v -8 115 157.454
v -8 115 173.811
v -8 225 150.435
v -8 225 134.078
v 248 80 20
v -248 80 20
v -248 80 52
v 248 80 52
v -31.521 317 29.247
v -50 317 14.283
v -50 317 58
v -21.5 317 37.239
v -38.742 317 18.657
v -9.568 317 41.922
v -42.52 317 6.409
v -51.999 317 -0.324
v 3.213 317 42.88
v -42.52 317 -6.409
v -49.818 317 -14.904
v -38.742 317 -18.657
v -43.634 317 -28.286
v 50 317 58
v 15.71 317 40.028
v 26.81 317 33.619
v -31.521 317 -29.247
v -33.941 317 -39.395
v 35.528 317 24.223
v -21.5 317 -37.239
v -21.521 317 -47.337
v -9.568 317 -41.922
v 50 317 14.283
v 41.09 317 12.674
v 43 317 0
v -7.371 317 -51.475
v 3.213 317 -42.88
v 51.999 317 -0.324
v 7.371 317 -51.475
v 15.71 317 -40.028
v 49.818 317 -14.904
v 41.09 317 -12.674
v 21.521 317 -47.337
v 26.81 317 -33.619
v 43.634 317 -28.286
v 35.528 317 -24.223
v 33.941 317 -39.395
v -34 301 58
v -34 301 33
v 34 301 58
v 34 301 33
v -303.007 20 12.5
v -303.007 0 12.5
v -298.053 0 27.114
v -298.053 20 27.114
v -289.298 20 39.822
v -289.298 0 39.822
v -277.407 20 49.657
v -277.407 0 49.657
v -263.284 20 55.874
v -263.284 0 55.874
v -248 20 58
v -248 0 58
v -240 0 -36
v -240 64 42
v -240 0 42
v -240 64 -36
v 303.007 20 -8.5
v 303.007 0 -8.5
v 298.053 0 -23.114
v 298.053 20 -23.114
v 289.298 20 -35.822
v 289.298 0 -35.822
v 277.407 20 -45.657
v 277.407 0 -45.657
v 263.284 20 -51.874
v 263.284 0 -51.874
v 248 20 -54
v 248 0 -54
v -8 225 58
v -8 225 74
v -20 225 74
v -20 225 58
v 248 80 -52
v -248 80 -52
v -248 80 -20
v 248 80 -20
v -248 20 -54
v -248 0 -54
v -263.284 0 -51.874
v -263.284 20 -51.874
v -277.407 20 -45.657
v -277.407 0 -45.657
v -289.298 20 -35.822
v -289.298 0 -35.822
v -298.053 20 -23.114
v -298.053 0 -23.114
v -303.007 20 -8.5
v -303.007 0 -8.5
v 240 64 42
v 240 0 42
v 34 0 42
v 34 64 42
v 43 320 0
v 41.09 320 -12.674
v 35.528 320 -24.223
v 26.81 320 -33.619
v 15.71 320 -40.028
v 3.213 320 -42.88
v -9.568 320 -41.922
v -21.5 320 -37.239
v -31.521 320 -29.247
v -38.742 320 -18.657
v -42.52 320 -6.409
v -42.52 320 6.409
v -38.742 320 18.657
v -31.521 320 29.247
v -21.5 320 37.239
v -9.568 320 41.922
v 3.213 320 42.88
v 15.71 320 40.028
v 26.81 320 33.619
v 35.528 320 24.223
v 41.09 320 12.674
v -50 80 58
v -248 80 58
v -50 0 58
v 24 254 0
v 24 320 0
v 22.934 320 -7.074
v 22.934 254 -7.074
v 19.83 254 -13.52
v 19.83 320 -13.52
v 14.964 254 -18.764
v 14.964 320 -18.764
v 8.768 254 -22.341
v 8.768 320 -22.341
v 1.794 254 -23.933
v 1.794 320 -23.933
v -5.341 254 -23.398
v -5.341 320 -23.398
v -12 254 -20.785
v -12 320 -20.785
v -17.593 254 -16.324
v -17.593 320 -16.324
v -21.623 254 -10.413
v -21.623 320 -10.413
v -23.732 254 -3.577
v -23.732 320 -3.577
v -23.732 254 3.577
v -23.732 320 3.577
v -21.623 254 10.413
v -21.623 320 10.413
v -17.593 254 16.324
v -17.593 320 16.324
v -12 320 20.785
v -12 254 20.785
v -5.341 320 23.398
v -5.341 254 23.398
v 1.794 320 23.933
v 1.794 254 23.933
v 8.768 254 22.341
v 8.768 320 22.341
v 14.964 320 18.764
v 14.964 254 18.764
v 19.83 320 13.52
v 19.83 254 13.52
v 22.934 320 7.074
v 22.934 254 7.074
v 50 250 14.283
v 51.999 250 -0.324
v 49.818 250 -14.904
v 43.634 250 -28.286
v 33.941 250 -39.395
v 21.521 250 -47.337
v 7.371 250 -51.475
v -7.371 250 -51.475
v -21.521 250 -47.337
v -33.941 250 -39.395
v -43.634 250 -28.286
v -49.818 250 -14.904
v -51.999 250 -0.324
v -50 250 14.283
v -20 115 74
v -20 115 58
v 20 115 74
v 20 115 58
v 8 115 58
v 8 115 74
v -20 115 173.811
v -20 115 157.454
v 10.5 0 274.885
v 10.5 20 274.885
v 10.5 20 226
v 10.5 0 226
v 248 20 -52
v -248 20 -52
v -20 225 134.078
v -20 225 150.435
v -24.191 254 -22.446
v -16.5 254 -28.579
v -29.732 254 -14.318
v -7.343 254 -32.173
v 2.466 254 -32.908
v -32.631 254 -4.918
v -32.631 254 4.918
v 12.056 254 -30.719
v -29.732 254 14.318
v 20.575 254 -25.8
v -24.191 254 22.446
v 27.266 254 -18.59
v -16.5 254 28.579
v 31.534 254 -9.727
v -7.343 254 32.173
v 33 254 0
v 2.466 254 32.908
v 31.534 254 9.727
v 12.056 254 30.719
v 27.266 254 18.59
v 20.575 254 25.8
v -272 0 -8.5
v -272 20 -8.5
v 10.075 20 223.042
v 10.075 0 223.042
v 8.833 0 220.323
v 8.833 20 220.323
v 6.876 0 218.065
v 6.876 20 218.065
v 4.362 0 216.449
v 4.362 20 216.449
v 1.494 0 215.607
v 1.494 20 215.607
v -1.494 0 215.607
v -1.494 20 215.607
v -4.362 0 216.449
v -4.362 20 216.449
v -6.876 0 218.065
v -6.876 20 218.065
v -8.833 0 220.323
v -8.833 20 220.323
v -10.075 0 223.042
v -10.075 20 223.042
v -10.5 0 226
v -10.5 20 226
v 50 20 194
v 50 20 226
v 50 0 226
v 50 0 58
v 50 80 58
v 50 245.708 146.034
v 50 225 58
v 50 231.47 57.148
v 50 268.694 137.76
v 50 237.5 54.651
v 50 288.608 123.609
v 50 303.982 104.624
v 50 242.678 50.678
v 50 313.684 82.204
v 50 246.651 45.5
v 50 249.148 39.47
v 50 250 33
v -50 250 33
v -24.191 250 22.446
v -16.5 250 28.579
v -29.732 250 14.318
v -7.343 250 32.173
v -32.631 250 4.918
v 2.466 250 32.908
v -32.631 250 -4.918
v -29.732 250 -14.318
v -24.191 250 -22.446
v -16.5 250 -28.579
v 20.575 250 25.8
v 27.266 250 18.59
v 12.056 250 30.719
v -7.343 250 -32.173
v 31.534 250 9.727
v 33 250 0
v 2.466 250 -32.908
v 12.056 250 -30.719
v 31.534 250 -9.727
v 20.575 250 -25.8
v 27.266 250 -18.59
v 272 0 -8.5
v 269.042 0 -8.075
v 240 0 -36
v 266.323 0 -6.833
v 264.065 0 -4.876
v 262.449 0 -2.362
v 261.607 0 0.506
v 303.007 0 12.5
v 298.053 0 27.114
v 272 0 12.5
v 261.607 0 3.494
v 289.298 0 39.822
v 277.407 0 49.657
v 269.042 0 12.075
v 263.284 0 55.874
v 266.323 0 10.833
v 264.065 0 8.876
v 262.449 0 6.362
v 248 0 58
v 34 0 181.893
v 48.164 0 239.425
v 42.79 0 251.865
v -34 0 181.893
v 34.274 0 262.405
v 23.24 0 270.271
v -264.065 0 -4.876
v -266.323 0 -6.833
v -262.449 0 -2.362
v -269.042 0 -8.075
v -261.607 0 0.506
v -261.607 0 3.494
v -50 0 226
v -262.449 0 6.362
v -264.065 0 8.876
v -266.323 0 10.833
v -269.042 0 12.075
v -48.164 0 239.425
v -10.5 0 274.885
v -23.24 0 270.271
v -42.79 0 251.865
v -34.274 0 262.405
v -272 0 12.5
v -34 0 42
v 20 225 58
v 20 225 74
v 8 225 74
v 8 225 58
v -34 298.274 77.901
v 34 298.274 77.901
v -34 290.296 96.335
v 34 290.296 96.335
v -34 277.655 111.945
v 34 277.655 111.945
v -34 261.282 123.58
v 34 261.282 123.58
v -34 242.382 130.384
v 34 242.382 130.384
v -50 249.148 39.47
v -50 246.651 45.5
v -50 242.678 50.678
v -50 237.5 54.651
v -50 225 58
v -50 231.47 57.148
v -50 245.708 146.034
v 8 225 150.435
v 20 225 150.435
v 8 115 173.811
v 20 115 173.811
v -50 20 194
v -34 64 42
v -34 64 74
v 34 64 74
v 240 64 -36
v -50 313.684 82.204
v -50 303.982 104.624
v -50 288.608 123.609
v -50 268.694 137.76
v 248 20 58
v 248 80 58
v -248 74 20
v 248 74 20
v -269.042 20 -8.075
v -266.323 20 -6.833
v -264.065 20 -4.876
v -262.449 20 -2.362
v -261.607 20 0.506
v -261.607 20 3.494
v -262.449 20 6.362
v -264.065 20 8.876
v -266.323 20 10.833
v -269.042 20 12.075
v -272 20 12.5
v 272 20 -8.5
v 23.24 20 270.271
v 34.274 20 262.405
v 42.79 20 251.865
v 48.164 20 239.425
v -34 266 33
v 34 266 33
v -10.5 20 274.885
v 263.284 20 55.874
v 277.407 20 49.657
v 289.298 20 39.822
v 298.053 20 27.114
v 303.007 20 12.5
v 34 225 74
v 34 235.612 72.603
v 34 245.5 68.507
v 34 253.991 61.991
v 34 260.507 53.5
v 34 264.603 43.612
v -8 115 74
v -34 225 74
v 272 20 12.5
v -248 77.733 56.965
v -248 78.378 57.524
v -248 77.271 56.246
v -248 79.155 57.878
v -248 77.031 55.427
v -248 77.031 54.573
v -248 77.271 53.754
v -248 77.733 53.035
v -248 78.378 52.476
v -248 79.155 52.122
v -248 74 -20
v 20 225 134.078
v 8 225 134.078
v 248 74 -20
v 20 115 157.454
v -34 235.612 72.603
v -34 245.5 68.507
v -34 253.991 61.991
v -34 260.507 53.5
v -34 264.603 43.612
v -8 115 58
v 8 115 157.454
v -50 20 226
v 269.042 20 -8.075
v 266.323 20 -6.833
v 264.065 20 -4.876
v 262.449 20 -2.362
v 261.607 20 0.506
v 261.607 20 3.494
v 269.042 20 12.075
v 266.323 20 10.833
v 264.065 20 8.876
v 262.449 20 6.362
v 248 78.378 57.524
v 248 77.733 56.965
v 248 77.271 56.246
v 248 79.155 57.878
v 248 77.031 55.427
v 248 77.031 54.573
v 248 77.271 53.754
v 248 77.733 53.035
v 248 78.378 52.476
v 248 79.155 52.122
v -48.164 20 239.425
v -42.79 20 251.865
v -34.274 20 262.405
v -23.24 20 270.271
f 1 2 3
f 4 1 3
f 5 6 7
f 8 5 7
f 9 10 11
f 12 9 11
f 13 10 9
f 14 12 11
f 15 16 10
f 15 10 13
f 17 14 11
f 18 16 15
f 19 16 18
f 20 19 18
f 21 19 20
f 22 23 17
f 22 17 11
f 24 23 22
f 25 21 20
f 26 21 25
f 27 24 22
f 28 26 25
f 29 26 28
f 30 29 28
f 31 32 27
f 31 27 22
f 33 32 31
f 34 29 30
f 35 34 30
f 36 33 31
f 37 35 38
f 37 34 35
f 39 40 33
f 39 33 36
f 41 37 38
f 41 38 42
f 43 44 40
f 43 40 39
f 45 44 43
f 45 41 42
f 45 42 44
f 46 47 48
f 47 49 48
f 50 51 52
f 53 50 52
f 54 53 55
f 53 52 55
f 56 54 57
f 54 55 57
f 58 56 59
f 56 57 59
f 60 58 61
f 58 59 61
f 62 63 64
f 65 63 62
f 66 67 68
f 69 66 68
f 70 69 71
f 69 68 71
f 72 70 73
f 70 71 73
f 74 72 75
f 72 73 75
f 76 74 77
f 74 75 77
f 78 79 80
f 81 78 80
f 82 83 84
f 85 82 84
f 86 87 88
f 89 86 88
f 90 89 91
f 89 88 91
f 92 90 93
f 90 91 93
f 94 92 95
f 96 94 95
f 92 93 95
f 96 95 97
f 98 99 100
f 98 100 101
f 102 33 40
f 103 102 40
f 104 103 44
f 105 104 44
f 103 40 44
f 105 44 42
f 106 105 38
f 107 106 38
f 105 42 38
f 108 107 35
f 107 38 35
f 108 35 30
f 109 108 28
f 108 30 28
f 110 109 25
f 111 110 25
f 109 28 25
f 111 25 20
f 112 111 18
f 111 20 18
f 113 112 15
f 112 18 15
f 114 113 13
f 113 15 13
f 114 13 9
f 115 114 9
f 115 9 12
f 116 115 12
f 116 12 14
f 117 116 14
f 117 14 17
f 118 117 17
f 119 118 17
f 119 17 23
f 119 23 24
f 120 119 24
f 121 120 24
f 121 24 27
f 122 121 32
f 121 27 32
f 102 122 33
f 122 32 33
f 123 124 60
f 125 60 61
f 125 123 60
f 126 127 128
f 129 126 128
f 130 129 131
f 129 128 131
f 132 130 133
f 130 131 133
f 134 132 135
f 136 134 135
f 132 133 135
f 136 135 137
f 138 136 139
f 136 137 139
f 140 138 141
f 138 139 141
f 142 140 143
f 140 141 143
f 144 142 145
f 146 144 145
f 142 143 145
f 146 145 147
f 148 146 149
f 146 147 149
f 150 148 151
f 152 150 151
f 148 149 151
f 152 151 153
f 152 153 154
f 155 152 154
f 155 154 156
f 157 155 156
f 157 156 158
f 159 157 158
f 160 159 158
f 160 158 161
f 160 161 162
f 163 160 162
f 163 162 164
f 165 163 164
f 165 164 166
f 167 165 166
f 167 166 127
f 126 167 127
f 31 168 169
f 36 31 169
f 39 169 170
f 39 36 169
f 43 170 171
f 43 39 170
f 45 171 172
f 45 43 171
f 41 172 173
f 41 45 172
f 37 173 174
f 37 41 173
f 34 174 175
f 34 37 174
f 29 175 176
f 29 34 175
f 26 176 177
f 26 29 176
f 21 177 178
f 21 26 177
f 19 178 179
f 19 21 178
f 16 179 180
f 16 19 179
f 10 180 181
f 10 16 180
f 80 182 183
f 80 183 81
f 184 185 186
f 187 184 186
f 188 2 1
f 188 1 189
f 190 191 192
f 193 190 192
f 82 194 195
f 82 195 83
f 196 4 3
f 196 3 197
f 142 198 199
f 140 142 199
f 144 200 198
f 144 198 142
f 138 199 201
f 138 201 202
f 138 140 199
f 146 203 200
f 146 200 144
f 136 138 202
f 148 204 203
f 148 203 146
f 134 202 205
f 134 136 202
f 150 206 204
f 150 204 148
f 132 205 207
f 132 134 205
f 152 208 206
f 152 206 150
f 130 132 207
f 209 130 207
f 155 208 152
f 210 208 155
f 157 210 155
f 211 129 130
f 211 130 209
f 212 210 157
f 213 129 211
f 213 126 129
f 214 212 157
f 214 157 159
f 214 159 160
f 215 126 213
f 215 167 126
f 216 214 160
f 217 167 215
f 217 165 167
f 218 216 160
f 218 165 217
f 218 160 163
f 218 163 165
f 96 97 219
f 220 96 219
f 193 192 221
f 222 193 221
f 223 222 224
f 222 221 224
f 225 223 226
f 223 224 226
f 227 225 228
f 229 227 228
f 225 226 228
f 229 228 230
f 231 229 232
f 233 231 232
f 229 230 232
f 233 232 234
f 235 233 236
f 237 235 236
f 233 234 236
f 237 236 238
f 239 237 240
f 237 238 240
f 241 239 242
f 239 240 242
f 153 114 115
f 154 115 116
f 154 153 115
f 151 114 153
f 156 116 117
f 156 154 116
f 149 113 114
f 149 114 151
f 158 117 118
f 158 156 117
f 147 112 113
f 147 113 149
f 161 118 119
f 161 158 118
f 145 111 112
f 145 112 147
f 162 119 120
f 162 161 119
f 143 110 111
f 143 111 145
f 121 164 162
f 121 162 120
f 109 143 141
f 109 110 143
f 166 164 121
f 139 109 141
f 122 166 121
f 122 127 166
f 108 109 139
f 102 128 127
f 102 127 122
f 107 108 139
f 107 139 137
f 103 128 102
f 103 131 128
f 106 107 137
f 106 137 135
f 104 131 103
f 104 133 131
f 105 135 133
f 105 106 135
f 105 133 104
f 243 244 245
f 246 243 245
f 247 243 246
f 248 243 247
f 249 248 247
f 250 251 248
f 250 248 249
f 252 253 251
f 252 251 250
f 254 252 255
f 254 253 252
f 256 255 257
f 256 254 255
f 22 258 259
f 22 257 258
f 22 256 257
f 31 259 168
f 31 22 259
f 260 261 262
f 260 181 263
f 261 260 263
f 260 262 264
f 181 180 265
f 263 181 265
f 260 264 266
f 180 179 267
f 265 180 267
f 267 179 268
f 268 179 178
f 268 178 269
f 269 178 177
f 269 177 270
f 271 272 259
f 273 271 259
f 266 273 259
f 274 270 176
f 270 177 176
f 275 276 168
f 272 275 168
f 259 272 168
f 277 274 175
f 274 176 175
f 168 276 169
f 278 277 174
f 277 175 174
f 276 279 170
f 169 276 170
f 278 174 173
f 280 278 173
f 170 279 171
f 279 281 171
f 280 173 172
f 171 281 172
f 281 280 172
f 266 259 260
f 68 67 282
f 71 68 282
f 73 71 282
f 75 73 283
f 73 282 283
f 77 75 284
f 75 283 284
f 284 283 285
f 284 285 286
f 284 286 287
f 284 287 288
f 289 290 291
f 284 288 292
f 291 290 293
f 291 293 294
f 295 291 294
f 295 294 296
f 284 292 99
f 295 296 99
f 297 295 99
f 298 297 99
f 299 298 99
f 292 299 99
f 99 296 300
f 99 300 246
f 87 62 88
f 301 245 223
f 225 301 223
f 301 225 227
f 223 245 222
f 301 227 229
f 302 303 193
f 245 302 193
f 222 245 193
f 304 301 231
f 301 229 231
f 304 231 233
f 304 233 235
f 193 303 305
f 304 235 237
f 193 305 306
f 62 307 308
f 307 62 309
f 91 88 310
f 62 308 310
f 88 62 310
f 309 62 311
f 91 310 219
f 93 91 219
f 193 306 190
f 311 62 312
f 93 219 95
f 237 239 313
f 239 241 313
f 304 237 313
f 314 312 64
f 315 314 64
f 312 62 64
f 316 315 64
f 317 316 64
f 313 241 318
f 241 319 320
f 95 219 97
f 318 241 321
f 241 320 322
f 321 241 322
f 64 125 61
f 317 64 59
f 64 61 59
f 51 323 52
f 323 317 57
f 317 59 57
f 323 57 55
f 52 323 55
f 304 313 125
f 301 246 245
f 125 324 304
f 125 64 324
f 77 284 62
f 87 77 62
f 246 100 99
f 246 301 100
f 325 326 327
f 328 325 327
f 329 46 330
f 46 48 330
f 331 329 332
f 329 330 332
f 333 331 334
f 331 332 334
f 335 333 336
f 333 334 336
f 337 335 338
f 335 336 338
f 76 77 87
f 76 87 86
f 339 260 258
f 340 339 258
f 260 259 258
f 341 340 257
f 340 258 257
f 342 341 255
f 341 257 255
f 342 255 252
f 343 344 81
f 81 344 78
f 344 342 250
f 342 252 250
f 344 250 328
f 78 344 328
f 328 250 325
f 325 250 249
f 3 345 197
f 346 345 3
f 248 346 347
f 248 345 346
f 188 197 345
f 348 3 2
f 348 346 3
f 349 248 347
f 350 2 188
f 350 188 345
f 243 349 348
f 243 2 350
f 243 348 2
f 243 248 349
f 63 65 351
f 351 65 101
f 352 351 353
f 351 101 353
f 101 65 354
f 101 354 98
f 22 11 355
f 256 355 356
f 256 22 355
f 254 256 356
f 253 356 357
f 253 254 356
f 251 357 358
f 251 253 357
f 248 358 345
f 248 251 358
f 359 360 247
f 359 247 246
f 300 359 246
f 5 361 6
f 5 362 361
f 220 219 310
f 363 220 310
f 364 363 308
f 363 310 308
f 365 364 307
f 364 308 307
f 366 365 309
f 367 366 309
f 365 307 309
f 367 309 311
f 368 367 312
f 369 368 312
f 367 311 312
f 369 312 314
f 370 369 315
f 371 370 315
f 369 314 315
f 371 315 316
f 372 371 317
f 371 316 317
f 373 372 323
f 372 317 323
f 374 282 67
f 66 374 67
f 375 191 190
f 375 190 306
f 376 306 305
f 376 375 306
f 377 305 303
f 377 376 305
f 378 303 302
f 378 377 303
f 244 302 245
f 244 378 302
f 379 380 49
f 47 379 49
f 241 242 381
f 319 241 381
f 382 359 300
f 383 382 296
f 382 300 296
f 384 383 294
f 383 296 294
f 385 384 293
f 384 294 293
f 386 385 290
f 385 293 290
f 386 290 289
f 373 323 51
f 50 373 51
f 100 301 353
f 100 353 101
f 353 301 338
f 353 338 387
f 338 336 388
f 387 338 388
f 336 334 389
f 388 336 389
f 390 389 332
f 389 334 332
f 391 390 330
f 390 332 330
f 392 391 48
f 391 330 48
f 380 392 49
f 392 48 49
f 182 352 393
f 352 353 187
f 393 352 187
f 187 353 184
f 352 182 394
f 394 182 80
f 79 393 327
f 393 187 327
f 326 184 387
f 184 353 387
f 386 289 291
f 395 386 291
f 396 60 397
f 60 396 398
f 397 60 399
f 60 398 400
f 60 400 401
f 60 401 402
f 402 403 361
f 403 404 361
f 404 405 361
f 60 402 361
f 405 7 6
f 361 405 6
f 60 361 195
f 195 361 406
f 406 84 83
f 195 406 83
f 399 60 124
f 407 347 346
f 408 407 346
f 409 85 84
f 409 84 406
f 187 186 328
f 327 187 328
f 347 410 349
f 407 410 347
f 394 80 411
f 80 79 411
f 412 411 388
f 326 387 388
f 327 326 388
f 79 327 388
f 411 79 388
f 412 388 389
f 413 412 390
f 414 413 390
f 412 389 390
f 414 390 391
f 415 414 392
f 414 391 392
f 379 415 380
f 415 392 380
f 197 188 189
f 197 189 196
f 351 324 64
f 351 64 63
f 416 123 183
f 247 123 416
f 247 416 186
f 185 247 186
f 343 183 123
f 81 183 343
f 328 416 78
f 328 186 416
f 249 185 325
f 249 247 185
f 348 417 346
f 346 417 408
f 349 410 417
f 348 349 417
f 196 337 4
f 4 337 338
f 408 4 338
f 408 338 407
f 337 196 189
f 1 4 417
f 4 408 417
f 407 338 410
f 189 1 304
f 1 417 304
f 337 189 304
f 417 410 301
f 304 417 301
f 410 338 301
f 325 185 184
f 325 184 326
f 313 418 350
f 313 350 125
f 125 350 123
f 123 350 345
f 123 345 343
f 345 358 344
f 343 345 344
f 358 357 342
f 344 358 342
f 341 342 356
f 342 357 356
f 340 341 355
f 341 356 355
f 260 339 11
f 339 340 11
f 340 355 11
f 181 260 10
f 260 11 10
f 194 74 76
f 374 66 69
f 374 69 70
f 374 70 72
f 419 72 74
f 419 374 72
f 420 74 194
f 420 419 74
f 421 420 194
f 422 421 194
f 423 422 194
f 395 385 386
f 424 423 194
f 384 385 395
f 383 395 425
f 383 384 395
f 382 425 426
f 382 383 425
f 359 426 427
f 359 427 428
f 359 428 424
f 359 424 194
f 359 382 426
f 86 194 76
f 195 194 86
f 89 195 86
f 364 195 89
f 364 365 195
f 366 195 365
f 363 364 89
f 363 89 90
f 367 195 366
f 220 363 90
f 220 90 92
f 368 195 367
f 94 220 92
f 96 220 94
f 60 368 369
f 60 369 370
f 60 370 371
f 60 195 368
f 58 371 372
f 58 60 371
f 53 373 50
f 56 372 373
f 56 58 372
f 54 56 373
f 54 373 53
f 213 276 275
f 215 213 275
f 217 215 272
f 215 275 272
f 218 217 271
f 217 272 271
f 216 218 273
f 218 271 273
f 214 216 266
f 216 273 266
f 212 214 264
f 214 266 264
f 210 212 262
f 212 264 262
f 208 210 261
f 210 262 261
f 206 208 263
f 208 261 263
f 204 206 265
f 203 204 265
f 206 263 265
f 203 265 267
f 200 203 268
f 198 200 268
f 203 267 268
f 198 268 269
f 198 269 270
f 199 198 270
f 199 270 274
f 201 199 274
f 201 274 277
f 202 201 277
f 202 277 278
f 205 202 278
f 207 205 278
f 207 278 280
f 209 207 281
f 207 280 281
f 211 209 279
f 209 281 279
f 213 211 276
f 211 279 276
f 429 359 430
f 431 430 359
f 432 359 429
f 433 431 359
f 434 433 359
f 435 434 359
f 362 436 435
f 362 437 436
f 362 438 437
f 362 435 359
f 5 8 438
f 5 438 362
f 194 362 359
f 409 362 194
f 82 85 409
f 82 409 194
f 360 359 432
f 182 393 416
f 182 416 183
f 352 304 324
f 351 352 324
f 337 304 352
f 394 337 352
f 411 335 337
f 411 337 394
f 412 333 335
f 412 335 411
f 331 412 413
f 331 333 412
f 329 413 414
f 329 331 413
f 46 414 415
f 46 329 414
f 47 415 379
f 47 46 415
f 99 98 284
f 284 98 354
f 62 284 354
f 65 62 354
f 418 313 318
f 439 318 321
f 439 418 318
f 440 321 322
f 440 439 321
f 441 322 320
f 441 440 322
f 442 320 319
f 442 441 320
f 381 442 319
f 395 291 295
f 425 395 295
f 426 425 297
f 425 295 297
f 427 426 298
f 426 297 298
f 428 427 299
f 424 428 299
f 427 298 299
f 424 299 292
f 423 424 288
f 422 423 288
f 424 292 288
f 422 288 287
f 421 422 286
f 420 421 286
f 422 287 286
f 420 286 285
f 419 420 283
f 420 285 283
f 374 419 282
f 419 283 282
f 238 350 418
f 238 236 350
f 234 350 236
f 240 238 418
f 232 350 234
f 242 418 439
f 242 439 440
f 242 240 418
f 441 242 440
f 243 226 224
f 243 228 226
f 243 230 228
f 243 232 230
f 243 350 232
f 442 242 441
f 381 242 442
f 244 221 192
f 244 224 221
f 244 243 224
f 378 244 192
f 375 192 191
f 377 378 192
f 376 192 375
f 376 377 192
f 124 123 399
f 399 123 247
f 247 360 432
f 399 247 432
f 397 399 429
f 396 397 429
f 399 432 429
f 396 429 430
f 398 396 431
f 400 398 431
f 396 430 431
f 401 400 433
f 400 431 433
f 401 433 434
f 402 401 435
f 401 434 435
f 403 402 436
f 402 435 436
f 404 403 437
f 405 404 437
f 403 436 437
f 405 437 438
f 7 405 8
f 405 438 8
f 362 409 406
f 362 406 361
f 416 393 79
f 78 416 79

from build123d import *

# Parameters (mm, degrees)
BOSS_EXTRUDE1_DEPTH = 50
SKETCH2_R           = 52
BOSS_EXTRUDE2_DEPTH = 67
SKETCH3_R           = 43
BOSS_EXTRUDE3_DEPTH = 3
CUT_EXTRUDE1_REACH  = 322
SKETCH4_R           = 24
SKETCH5_R           = 33
CUT_EXTRUDE2_DEPTH  = 4
BOSS_EXTRUDE4_DEPTH = 248
SKETCH7_R           = 3
CUT_EXTRUDE3_DEPTH  = 248
BOSS_EXTRUDE5_DEPTH = 20
SKETCH9_R           = 50
BOSS_EXTRUDE6_DEPTH = 20
CUT_EXTRUDE4_REACH  = 22
FILLET1_R           = 25
CUT_EXTRUDE5_DEPTH  = 34
SKETCH12_W          = 78
SKETCH12_H          = 64
CUT_EXTRUDE6_DEPTH  = 240
SKETCH13_W          = 12
SKETCH13_H          = 110
CUT_EXTRUDE7_DEPTH  = 240


with BuildPart() as part:
    # Sketch1 → Boss-Extrude1 (new body, symmetric)
    with BuildSketch(Plane(origin=(0, 0, 0), x_dir=(0, 0, -1), z_dir=(1, 0, 0))):
        with BuildLine():
            Line((-226, 0), (54, 0))
            Line((54, 0), (54, 20))
            Line((54, 20), (52, 20))
            Line((52, 20), (52, 80))
            Line((52, 80), (20, 80))
            Line((20, 80), (20, 74))
            Line((20, 74), (-20, 74))
            Line((-20, 74), (-20, 80))
            Line((-20, 80), (-58, 80))
            Line((-58, 80), (-58, 250))
            Line((-58, 250), (0, 250))
            Line((0, 250), (0, 317))
            Line((0, 317), (-58, 317))
            ThreePointArc((-58, 317), (-114.640297133, 296.941952651), (-146.034066228, 245.708372014))
            Line((-146.034066228, 245.708372014), (-194, 20))
            Line((-194, 20), (-226, 20))
            Line((-226, 20), (-226, 0))
        make_face()
    extrude(amount=BOSS_EXTRUDE1_DEPTH, both=True)

    # Sketch2 → Boss-Extrude2 (add)
    with BuildSketch(Plane(origin=(0, 317, 0), x_dir=(1, 0, 0), z_dir=(0, 1, 0))):
        Circle(SKETCH2_R)
    extrude(amount=-BOSS_EXTRUDE2_DEPTH)

    # Sketch3 → Boss-Extrude3 (add)
    with BuildSketch(Plane(origin=(0, 317, 0), x_dir=(1, 0, 0), z_dir=(0, 1, 0))):
        Circle(SKETCH3_R)
    extrude(amount=BOSS_EXTRUDE3_DEPTH)

    # Sketch4 → Cut-Extrude1 (cut, up to next)
    with BuildSketch(Plane(origin=(0, 320, 0), x_dir=(1, 0, 0), z_dir=(0, 1, 0)), mode=Mode.PRIVATE) as cut_extrude1_sk1:
        Circle(SKETCH4_R)
    cut_extrude1_tool1 = extrude(cut_extrude1_sk1.sketch, amount=-CUT_EXTRUDE1_REACH, mode=Mode.PRIVATE) & part.part
    add(cut_extrude1_tool1.solids().sort_by_distance((0, 320, 0))[0], mode=Mode.SUBTRACT)

    # Sketch5 → Cut-Extrude2 (cut)
    with BuildSketch(Plane.XZ.offset(-250)):
        Circle(SKETCH5_R)
    extrude(amount=-CUT_EXTRUDE2_DEPTH, mode=Mode.SUBTRACT)

    # Sketch6 → Boss-Extrude4 (add, symmetric)
    with BuildSketch(Plane(origin=(0, 0, 0), x_dir=(0, 0, -1), z_dir=(1, 0, 0))):
        Polygon((-58, 80), (-58, 0), (54, 0), (54, 20), (52, 20), (52, 80), (20, 80), (20, 74), (-20, 74), (-20, 80), align=None)
    extrude(amount=BOSS_EXTRUDE4_DEPTH, both=True)

    # Sketch7 → Cut-Extrude3 (cut, symmetric)
    with BuildSketch(Plane(origin=(0, 0, 0), x_dir=(0, 0, -1), z_dir=(1, 0, 0))):
        with Locations((-55, 80)):
            Circle(SKETCH7_R)
    extrude(amount=CUT_EXTRUDE3_DEPTH, both=True, mode=Mode.SUBTRACT)

    # Sketch8 → Boss-Extrude5 (add)
    with BuildSketch(Plane.XZ):
        with BuildLine():
            Line((-272, 12.5), (-303.006817759, 12.5))
            ThreePointArc((-303.006817759, 12.5), (-192, 2), (-303.006817759, -8.5))
            Line((-303.006817759, -8.5), (-272, -8.5))
            ThreePointArc((-272, -8.5), (-261.5, 2), (-272, 12.5))
        make_face()
        with BuildLine():
            Line((272, -8.5), (303.006817759, -8.5))
            ThreePointArc((303.006817759, -8.5), (192, 2), (303.006817759, 12.5))
            Line((303.006817759, 12.5), (272, 12.5))
            ThreePointArc((272, 12.5), (261.5, 2), (272, -8.5))
        make_face()
    extrude(amount=-BOSS_EXTRUDE5_DEPTH)

    # Sketch9 → Boss-Extrude6 (add)
    with BuildSketch(Plane(origin=(0, 20, 0), x_dir=(1, 0, 0), z_dir=(0, 1, 0))):
        with Locations((0, -226)):
            Circle(SKETCH9_R)
    extrude(amount=-BOSS_EXTRUDE6_DEPTH)

    # Sketch10 → Cut-Extrude4 (cut, up to next)
    with BuildSketch(Plane(origin=(0, 20, 0), x_dir=(1, 0, 0), z_dir=(0, 1, 0)), mode=Mode.PRIVATE) as cut_extrude4_sk1:
        with BuildLine():
            ThreePointArc((10.5, -226), (0, -215.5), (-10.5, -226))
            Line((-10.5, -226), (-10.5, -291))
            ThreePointArc((-10.5, -291), (0, -301.5), (10.5, -291))
            Line((10.5, -291), (10.5, -226))
        make_face()
    cut_extrude4_tool1 = extrude(cut_extrude4_sk1.sketch, amount=-CUT_EXTRUDE4_REACH, mode=Mode.PRIVATE) & part.part
    add(cut_extrude4_tool1.solids().sort_by_distance((0, 20, 258.5))[0], mode=Mode.SUBTRACT)

    # Fillet1
    fillet1_edges = [part.edges().sort_by_distance(p)[0] for p in [
        (0, 250, 58),
    ]]
    fillet(fillet1_edges, radius=FILLET1_R)

    # Sketch11 → Cut-Extrude5 (cut, symmetric)
    with BuildSketch(Plane(origin=(0, 0, 0), x_dir=(0, 0, -1), z_dir=(1, 0, 0))):
        with BuildLine():
            Line((-130.383565565, 242.382439212), (-181.892953201, 0))
            Line((-181.892953201, 0), (0, 0))
            Line((0, 0), (0, 64))
            Line((0, 64), (-74, 64))
            Line((-74, 64), (-74, 225))
            ThreePointArc((-74, 225), (-61.991378029, 253.991378029), (-33, 266))
            Line((-33, 266), (-33, 301))
            Line((-33, 301), (-58, 301))
            ThreePointArc((-58, 301), (-104.570910976, 284.507827735), (-130.383565565, 242.382439212))
        make_face()
    extrude(amount=CUT_EXTRUDE5_DEPTH, both=True, mode=Mode.SUBTRACT)

    # Sketch12 → Cut-Extrude6 (cut, symmetric)
    with BuildSketch(Plane(origin=(0, 0, 0), x_dir=(0, 0, -1), z_dir=(1, 0, 0))):
        with Locations((-3, 32)):
            Rectangle(SKETCH12_W, SKETCH12_H)
    extrude(amount=CUT_EXTRUDE6_DEPTH, both=True, mode=Mode.SUBTRACT)

    # Sketch13 → Cut-Extrude7 (cut, symmetric)
    with BuildSketch(Plane(origin=(0, 0, 58), x_dir=(-1, 0, 0), z_dir=(0, 0, -1))):
        with Locations((14, 170)):
            Rectangle(SKETCH13_W, SKETCH13_H)
        with Locations((-14, 170)):
            Rectangle(SKETCH13_W, SKETCH13_H)
    extrude(amount=CUT_EXTRUDE7_DEPTH, both=True, mode=Mode.SUBTRACT)


solid = part.part
